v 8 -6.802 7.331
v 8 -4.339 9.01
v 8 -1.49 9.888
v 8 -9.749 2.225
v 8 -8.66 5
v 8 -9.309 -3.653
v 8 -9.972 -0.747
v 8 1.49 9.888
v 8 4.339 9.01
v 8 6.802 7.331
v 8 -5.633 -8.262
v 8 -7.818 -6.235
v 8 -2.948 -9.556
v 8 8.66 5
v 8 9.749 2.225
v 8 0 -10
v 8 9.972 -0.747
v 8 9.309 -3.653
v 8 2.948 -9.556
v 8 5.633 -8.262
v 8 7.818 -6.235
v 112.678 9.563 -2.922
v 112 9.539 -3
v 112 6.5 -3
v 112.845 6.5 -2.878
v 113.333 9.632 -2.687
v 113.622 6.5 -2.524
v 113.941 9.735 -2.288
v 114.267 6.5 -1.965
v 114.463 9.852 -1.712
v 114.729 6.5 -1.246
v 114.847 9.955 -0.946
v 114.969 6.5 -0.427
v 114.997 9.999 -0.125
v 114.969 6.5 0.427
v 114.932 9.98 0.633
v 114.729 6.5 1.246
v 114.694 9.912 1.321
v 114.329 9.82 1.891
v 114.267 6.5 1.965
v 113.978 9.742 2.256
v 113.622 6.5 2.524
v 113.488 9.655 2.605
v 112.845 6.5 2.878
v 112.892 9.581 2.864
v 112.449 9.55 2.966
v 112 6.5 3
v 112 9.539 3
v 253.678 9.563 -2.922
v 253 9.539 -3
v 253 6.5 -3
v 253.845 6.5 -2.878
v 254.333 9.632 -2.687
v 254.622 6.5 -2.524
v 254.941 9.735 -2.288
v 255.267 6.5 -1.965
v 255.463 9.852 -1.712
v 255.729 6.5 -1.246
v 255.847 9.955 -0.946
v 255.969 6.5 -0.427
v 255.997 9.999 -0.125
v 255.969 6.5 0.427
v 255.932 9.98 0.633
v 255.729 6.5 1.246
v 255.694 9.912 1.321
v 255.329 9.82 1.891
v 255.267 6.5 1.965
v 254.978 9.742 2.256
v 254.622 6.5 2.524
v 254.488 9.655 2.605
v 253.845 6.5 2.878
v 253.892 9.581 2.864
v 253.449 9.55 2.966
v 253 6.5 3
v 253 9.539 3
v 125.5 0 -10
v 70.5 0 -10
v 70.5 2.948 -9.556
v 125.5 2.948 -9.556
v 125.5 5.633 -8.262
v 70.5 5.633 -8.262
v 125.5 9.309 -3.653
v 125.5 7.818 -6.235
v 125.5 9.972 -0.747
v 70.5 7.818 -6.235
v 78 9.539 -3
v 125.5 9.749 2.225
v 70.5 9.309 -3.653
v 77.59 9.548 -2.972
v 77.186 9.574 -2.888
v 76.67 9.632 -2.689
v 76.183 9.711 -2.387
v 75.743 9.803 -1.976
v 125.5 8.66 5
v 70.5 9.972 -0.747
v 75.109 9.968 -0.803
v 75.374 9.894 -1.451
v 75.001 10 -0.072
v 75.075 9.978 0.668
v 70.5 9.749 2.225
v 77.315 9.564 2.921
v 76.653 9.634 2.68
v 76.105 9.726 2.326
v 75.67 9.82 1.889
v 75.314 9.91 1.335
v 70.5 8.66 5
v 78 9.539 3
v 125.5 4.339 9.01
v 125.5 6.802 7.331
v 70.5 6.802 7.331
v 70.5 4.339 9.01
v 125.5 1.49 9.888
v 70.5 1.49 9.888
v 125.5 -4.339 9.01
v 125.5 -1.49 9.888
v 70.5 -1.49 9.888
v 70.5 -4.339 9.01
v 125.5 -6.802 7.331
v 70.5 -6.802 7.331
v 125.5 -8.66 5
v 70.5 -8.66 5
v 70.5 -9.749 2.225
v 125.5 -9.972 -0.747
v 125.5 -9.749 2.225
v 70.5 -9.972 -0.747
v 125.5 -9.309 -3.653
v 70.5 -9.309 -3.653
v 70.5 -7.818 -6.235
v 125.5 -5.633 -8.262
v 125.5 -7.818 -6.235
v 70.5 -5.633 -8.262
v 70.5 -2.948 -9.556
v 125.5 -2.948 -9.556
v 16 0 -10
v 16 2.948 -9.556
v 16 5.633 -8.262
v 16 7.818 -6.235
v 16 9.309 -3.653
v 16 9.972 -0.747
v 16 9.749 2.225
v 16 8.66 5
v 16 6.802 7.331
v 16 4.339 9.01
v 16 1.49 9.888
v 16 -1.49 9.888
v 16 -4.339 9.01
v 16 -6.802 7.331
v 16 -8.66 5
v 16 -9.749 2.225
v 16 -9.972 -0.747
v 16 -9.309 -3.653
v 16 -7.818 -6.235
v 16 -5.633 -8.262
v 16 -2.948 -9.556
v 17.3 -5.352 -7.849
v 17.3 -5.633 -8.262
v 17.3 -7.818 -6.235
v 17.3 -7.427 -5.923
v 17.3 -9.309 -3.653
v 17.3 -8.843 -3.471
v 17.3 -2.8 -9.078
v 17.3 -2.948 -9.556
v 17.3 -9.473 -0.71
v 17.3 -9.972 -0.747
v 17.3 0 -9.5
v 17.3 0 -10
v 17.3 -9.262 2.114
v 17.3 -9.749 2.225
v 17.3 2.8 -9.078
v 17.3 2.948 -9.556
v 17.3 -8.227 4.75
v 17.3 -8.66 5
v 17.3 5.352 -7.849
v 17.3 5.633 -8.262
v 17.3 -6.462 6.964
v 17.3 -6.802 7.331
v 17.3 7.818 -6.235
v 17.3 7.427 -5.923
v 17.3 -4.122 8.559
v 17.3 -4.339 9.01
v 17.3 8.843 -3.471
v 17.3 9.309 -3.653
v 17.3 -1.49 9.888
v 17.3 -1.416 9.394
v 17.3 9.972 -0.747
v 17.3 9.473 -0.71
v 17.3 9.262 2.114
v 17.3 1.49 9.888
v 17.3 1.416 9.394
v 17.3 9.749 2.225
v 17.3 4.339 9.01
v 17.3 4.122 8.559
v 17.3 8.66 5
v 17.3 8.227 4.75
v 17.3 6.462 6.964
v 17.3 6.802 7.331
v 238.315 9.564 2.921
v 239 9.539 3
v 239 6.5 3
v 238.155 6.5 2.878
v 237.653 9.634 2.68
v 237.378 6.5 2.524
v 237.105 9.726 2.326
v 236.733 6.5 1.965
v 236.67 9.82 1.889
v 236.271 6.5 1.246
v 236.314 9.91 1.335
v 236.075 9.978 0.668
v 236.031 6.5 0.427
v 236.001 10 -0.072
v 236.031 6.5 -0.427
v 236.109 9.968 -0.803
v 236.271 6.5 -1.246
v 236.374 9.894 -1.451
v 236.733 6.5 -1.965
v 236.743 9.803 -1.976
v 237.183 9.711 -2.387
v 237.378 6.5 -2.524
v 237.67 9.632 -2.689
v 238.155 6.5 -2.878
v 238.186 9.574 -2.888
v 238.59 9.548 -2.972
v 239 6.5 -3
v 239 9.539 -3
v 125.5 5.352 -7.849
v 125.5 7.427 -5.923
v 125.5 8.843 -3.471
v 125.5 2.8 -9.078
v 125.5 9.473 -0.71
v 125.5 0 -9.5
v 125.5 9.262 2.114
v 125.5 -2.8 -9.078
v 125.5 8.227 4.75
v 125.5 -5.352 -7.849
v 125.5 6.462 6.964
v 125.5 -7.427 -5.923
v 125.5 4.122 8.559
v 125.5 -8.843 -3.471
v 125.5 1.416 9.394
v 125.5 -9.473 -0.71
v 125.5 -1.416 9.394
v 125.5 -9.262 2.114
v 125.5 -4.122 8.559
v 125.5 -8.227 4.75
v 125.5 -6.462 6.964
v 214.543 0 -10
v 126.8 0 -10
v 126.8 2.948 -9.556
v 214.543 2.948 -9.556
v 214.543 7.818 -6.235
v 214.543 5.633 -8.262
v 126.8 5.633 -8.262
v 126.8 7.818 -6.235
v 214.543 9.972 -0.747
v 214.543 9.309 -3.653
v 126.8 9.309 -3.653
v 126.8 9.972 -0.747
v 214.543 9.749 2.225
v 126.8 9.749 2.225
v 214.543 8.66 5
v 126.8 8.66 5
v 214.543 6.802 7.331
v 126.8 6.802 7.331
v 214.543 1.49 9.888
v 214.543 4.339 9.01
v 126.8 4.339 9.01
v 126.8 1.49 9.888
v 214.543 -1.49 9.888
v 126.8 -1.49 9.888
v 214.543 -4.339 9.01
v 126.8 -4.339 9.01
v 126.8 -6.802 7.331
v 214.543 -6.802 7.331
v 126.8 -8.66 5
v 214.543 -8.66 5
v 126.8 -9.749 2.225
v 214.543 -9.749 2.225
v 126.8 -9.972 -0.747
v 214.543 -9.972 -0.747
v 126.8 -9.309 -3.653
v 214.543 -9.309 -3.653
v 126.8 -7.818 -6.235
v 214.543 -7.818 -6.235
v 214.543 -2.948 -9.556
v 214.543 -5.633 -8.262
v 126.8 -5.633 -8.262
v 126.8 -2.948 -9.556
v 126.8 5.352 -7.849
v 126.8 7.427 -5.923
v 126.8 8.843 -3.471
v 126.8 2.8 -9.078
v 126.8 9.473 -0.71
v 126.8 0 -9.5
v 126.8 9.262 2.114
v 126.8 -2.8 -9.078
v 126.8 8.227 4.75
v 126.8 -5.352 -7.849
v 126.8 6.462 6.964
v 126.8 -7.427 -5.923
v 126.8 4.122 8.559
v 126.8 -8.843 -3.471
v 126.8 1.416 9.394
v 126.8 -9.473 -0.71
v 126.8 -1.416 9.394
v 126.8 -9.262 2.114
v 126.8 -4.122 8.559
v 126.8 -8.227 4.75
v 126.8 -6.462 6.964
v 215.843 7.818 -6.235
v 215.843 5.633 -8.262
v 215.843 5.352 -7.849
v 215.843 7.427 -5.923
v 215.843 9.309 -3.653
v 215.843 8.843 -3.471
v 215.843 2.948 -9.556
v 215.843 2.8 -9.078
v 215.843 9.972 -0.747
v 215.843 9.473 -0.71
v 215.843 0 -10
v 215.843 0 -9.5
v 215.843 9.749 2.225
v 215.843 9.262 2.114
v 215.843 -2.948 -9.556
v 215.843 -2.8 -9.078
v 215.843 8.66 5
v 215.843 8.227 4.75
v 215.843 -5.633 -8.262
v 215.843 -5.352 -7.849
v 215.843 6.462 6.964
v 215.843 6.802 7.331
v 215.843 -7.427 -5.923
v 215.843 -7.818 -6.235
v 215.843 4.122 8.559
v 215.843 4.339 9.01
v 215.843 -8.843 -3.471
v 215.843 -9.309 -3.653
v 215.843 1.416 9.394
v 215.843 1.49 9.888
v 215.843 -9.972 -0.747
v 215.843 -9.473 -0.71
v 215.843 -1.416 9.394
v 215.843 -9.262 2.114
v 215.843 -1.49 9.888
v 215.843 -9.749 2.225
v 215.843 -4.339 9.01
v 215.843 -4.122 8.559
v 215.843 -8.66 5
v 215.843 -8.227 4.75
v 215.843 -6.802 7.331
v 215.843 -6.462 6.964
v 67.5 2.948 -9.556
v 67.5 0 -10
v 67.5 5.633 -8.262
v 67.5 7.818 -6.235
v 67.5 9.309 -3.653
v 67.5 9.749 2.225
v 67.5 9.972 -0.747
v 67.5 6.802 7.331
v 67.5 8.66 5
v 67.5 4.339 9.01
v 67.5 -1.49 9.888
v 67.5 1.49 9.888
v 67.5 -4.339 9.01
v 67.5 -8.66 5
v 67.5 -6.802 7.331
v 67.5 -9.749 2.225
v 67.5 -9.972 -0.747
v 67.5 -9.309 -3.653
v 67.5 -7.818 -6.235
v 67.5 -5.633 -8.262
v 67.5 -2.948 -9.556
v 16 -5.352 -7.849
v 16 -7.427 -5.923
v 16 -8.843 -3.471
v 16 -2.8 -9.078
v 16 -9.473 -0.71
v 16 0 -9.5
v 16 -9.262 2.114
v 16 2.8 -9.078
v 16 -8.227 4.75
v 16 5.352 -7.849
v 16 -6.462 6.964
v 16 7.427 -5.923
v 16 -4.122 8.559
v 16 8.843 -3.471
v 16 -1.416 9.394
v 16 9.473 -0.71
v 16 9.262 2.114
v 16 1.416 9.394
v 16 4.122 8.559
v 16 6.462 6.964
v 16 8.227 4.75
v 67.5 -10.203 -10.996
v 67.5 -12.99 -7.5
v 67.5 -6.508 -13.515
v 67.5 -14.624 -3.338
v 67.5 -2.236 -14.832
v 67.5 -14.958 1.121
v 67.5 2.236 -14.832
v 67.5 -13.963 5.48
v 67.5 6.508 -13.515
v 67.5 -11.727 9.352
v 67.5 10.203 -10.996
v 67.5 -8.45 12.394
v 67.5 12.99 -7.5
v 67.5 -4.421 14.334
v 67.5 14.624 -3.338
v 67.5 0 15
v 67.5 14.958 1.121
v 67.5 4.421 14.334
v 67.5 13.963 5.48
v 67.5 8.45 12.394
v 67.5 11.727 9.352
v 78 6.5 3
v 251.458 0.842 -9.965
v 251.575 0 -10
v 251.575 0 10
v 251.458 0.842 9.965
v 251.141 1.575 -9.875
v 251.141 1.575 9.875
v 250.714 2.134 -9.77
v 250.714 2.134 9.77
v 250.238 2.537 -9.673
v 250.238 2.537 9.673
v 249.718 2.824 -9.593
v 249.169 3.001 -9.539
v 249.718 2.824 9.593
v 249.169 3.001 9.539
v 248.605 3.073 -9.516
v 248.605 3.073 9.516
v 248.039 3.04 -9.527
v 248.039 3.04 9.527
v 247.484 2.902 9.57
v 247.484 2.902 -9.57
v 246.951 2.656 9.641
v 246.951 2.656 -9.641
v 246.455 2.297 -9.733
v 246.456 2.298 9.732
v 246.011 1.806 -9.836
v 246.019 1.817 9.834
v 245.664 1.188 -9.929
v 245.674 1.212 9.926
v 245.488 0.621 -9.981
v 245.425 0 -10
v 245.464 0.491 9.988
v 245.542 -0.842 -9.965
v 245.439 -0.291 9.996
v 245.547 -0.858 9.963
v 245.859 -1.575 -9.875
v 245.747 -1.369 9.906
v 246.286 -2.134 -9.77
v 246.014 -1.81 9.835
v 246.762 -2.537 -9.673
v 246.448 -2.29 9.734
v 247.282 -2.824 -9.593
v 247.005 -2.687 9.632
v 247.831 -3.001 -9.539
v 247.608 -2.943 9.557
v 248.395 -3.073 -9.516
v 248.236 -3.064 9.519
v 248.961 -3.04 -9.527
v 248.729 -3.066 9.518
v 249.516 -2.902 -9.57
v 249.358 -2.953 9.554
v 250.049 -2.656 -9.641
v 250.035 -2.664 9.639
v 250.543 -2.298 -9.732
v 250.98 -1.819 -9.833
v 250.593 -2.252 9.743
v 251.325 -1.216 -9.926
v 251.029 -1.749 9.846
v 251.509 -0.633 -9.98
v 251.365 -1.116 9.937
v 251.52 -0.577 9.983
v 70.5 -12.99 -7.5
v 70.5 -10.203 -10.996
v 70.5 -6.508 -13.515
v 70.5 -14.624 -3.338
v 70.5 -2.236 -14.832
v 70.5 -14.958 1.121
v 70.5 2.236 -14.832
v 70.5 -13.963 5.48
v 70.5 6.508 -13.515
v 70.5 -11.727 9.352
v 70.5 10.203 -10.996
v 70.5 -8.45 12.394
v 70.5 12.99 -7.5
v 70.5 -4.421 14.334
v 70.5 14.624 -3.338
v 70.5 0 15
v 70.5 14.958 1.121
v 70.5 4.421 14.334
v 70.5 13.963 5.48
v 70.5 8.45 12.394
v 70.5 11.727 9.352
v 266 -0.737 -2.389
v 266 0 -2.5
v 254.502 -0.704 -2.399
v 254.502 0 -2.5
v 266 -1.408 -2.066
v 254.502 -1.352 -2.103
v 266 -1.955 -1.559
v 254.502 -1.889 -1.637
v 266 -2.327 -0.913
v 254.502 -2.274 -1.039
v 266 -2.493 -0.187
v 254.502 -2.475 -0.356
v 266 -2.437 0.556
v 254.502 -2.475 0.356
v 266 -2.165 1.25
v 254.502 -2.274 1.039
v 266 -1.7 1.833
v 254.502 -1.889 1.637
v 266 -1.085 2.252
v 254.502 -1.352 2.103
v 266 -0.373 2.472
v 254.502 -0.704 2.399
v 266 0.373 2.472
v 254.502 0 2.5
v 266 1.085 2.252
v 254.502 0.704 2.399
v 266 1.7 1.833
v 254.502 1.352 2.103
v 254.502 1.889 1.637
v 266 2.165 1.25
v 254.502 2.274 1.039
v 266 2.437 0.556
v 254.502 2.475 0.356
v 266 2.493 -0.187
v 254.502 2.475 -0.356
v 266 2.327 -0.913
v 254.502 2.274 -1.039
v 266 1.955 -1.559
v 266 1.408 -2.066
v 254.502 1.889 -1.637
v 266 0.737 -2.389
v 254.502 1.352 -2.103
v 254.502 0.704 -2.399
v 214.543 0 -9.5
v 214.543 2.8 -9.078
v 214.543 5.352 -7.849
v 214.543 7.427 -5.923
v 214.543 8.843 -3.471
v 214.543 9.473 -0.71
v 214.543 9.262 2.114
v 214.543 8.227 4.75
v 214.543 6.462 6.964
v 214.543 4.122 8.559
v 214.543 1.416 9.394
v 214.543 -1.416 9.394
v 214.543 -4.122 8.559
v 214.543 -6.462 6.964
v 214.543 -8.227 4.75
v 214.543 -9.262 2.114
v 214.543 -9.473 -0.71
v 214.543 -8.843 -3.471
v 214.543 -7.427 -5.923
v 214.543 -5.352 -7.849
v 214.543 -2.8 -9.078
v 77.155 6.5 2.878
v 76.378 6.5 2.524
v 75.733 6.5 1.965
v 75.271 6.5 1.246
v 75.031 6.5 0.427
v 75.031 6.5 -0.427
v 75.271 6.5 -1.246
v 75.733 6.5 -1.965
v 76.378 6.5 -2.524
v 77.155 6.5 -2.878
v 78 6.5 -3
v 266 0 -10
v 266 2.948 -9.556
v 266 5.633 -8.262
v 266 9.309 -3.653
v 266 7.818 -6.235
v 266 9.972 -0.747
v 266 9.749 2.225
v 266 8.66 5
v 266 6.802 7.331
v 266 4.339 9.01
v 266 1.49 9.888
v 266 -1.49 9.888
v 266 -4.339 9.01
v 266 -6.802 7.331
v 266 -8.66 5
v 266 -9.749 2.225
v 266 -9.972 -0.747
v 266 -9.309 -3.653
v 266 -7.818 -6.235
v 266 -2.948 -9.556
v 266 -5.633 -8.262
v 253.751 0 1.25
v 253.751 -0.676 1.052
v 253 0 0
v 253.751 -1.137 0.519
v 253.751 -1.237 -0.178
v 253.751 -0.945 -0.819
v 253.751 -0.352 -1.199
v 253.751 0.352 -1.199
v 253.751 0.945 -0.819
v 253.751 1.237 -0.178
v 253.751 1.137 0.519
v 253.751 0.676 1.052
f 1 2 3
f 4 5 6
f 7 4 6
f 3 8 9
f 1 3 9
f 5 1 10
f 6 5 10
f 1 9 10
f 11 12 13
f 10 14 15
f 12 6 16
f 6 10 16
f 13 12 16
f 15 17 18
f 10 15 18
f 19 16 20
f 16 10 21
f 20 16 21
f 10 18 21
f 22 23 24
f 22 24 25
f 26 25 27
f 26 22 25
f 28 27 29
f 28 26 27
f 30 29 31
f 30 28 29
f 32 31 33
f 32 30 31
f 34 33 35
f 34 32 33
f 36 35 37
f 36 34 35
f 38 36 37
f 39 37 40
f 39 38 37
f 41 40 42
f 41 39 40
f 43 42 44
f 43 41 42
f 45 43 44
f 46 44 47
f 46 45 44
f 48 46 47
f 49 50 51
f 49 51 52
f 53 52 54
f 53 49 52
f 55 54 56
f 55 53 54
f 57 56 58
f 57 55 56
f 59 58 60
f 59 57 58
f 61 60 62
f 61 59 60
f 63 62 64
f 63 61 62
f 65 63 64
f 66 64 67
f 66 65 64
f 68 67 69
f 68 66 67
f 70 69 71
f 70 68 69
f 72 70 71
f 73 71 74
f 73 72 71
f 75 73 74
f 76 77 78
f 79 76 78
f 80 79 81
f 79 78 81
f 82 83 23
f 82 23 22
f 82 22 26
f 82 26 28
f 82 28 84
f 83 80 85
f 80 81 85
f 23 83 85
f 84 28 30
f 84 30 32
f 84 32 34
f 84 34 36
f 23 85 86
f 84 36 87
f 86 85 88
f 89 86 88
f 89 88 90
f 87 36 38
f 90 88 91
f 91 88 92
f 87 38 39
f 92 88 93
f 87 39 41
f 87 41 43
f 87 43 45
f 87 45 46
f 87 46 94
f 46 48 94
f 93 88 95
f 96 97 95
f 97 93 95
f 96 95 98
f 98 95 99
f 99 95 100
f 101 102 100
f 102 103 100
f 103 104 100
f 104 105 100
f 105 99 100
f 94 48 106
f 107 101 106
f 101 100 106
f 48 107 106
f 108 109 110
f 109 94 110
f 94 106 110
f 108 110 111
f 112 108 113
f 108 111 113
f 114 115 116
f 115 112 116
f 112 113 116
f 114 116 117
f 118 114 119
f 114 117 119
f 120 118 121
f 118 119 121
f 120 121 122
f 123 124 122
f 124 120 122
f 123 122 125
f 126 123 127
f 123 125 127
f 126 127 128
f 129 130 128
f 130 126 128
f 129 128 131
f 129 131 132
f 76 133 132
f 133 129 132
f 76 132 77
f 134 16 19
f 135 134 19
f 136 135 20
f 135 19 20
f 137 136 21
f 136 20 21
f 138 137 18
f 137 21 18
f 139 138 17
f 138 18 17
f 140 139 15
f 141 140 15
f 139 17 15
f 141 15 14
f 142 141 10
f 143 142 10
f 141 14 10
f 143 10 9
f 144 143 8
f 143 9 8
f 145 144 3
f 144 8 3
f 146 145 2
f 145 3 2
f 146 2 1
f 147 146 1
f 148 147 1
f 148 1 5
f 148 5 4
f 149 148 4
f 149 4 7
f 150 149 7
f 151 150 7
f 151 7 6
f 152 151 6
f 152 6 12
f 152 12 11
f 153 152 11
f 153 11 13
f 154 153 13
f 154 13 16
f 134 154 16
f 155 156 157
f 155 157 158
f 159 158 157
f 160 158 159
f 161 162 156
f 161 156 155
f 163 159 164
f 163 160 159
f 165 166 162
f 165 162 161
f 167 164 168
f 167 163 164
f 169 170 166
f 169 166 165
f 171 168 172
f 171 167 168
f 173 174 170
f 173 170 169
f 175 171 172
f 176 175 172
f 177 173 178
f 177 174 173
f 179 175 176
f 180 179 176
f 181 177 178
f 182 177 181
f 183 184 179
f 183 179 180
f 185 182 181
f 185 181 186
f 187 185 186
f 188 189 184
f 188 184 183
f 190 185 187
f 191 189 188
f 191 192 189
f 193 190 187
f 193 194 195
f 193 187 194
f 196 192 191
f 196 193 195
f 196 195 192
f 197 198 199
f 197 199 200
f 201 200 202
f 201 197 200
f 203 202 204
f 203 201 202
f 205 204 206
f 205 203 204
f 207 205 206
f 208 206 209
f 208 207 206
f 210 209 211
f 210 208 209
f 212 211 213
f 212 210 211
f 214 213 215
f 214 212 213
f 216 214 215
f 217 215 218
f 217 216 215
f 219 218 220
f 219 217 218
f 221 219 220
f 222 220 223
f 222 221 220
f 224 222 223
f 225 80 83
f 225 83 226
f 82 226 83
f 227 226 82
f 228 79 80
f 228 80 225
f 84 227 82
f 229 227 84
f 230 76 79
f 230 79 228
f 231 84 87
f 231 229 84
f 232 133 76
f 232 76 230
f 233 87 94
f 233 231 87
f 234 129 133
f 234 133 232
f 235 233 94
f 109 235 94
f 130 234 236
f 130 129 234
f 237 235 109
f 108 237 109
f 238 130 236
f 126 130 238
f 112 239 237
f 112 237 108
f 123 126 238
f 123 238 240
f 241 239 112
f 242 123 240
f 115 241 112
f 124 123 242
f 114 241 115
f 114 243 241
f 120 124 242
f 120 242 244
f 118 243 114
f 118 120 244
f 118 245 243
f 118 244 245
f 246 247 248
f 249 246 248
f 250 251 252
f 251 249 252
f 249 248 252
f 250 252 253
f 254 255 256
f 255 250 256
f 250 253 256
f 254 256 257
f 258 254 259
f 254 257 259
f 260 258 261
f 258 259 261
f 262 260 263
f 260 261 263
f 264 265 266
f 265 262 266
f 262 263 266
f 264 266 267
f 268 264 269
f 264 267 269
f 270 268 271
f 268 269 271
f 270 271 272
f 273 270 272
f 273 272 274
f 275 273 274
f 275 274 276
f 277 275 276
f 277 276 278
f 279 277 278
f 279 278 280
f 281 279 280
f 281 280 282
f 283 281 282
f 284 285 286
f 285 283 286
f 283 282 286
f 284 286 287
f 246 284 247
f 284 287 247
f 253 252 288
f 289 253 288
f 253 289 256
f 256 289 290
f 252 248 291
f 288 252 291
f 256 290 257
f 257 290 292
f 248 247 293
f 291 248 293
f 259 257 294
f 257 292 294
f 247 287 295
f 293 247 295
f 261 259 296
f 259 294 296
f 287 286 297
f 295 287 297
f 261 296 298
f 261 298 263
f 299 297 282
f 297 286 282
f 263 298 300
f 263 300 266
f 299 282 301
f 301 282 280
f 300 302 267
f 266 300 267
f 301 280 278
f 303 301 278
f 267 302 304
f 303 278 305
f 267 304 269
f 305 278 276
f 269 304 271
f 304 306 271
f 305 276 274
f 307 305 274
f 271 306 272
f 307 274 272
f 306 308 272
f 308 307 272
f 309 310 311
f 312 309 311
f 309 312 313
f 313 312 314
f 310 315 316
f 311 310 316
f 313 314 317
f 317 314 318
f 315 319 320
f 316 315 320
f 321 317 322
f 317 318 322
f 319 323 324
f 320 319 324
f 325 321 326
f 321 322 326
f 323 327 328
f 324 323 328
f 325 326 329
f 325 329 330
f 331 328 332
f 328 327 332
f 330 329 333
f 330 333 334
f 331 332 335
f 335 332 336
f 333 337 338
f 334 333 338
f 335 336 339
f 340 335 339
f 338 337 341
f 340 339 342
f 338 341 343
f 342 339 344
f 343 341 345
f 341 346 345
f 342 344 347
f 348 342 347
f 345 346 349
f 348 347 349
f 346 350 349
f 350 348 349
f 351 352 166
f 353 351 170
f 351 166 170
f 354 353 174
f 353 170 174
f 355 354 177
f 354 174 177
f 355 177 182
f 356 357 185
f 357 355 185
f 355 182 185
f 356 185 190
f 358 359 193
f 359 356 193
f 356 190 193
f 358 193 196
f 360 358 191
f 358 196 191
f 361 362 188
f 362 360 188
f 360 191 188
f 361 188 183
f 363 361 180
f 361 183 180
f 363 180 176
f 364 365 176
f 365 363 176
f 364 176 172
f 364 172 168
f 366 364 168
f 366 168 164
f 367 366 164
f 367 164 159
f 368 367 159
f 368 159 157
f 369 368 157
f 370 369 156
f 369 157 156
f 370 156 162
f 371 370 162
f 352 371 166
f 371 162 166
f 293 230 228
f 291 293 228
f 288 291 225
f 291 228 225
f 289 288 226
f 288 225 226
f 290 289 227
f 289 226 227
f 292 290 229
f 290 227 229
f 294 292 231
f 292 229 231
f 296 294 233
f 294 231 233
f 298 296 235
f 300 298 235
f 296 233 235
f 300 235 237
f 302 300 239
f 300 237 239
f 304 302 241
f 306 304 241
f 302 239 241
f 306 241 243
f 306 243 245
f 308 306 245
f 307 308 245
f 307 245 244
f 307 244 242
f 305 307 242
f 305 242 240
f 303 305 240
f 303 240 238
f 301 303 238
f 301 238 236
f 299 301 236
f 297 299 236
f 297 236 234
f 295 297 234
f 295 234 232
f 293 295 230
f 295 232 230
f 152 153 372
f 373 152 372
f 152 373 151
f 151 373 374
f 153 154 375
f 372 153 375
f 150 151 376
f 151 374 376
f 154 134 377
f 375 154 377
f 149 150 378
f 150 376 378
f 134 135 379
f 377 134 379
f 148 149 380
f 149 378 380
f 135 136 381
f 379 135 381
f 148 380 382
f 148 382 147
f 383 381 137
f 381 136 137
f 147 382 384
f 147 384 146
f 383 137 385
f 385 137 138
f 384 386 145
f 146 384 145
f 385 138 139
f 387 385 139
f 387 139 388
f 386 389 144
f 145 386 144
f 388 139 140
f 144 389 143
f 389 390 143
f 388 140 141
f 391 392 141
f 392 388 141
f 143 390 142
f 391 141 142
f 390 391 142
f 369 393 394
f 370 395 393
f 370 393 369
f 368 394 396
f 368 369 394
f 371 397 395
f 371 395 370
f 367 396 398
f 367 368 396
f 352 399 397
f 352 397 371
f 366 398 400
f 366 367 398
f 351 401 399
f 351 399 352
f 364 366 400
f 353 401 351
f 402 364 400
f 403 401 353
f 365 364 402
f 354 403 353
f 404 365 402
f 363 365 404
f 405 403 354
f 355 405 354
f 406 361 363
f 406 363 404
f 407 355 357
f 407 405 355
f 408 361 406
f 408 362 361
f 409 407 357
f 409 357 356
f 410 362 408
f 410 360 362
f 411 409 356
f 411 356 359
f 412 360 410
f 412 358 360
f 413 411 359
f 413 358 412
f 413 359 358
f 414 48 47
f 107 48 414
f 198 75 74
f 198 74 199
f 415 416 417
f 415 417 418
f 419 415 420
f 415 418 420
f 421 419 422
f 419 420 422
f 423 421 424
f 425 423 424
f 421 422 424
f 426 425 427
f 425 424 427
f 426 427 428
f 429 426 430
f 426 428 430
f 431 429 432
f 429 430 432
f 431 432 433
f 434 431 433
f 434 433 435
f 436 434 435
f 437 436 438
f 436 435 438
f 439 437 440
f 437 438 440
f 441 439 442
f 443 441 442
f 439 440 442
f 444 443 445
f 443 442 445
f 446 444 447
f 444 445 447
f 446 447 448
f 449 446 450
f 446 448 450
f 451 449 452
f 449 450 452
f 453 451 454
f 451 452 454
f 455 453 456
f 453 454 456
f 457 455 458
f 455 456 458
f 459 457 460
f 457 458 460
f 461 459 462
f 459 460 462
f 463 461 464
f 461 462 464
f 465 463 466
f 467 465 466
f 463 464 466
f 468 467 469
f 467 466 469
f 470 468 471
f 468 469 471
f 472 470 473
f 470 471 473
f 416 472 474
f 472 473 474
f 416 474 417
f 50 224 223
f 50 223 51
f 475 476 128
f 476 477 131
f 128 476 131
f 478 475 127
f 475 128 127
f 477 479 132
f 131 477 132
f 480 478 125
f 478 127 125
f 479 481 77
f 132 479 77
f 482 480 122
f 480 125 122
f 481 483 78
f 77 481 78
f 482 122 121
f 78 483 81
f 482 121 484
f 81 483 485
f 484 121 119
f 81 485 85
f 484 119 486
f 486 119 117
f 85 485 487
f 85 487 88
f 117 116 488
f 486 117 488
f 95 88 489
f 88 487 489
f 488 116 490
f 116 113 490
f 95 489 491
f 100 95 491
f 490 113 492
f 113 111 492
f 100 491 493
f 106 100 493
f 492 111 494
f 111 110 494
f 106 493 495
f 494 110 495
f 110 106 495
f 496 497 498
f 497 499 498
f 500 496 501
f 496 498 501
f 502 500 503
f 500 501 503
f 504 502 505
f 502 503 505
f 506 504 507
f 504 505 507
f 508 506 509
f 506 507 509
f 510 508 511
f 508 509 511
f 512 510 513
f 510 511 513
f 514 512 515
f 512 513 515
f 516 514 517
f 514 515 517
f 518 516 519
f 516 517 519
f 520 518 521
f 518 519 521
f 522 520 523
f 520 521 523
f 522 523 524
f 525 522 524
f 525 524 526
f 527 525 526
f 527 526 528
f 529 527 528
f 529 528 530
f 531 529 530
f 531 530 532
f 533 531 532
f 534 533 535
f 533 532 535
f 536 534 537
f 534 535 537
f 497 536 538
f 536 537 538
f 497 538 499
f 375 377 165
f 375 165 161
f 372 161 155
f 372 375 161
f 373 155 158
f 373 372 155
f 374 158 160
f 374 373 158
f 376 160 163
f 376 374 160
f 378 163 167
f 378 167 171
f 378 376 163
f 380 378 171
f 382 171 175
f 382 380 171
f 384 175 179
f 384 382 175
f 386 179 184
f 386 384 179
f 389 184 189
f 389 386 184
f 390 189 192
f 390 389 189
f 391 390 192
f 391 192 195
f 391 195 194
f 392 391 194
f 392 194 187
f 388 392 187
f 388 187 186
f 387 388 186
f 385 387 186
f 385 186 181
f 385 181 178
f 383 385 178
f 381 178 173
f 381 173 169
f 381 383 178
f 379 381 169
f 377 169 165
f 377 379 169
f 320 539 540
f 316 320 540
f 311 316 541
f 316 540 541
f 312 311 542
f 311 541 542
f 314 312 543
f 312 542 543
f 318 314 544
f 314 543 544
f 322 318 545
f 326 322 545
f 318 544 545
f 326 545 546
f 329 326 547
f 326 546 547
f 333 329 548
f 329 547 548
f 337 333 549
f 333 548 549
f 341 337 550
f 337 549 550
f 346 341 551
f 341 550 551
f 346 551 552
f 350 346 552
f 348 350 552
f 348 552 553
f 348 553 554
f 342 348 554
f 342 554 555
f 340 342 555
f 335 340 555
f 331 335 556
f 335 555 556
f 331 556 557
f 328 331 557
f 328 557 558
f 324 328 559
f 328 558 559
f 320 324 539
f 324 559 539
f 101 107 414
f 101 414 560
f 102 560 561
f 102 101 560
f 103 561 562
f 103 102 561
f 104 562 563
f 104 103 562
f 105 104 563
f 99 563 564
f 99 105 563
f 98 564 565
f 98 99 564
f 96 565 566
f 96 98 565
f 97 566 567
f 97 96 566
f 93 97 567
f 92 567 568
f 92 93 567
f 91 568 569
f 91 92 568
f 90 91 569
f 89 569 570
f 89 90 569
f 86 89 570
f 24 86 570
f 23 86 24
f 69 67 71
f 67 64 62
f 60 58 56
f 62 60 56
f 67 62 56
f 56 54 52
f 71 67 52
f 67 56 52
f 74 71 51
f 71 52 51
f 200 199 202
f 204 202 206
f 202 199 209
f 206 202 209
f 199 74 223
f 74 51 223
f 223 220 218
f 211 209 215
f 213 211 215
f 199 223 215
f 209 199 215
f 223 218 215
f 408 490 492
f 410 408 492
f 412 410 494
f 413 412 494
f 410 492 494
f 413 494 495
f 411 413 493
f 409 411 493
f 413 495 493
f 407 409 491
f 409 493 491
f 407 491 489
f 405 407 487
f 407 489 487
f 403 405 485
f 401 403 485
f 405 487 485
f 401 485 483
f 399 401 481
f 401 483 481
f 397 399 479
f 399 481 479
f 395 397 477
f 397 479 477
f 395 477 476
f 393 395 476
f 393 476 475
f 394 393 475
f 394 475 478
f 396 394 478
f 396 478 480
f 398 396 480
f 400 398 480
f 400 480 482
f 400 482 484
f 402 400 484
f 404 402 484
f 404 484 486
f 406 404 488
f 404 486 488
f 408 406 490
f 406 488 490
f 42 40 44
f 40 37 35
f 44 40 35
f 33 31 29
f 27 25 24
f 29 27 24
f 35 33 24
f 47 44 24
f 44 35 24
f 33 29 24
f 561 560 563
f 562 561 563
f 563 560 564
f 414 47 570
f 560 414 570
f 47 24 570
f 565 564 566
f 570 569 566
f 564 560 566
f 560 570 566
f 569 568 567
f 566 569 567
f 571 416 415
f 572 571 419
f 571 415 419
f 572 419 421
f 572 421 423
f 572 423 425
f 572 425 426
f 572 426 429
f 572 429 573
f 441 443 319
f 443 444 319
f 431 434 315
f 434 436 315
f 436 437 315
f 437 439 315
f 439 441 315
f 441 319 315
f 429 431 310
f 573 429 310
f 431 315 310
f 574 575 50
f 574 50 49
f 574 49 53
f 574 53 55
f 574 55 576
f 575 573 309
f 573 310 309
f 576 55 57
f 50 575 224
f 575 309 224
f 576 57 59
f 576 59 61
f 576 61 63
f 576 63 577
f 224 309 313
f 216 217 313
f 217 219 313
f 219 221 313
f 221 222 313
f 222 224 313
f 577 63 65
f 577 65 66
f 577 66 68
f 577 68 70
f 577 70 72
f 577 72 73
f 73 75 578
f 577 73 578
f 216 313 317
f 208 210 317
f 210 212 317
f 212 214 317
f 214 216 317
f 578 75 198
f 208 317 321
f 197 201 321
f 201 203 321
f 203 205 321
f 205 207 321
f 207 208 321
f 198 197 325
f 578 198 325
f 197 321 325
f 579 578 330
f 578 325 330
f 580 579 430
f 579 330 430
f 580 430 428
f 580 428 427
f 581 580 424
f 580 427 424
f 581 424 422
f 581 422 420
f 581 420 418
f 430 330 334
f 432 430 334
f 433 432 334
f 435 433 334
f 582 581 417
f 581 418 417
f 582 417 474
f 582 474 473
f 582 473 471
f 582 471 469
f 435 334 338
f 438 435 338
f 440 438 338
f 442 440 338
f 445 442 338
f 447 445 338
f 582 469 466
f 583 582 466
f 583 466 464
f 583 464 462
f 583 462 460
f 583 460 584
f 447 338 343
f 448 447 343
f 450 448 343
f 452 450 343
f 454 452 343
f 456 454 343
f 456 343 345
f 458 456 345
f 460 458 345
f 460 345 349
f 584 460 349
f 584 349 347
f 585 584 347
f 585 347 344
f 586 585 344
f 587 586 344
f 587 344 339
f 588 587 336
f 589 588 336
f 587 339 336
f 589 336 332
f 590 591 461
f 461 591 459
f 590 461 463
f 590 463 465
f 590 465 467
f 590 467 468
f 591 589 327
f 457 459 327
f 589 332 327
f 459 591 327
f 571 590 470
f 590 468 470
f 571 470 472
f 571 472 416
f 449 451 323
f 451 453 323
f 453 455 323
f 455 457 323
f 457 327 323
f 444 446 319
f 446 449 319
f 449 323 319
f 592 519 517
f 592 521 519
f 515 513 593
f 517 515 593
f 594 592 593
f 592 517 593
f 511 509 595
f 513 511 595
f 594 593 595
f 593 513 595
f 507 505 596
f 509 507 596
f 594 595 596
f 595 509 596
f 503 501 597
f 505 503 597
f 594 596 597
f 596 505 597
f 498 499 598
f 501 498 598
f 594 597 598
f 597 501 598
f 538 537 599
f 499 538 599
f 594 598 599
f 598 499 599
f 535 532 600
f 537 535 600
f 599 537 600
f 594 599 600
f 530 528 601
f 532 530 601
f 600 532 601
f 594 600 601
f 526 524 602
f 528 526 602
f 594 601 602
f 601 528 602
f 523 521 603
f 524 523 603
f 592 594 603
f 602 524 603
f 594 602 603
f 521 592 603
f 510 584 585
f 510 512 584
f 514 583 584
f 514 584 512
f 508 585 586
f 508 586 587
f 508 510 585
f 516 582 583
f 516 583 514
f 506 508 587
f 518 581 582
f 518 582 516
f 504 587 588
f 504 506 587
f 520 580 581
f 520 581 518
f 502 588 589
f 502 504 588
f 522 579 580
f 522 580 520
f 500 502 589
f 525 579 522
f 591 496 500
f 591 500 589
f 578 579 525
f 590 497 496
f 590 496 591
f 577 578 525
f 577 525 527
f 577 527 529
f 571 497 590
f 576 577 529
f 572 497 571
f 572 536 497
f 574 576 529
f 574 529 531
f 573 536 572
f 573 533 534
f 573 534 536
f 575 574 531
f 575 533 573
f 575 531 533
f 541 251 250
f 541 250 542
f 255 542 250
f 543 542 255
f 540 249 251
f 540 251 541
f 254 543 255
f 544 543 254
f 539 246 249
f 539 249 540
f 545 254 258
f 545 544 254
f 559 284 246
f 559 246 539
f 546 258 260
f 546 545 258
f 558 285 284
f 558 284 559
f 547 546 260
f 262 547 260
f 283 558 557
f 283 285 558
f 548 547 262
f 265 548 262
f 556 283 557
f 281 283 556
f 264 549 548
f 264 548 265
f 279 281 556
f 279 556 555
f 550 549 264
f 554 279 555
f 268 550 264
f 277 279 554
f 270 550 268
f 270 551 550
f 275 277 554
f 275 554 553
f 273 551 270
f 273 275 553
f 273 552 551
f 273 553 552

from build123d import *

# Parameters (mm, degrees)
SALIENTE_EXTRUIR1_START                = 8
CROQUIS1_R                             = 10
SALIENTE_EXTRUIR1_DEPTH                = 258
CROQUIS2_R                             = 15
SALIENTE_EXTRUIR2_DEPTH                = 3
CORTAR_EXTRUIR1_REACH                  = 268.845
CORTAR_EXTRUIR1_END_RADIUS             = 10
CROQUIS3_R                             = 3.075
CORTAR_EXTRUIR1_DIRECTION_2_REACH      = 268.845
CORTAR_EXTRUIR1_DIRECTION_2_END_RADIUS = 10
CORTAR_EXTRUIR2_START                  = 10
CORTAR_EXTRUIR2_DEPTH                  = 3.5
TALADRO_ROSCADO_M61_D                  = 5
TALADRO_ROSCADO_M61_DEPTH              = 11.497848452
TALADRO_ROSCADO_M61_TIP                = 1.502151548
CORTAR_EXTRUIR3_START                  = 10
CORTAR_EXTRUIR3_DEPTH                  = 3.5
CORTAR_EXTRUIR4_START                  = 125.5
CROQUIS9_R                             = 10
CROQUIS9_R_2                           = 9.5
CORTAR_EXTRUIR4_DEPTH                  = 1.3
CORTAR_EXTRUIR5_START                  = 214.543146
CROQUIS10_R                            = 10
CROQUIS10_R_2                          = 9.5
CORTAR_EXTRUIR5_DEPTH                  = 1.3
CORTAR_EXTRUIR6_START                  = -8
CROQUIS11_R                            = 10
CROQUIS11_R_2                          = 9.5
CORTAR_EXTRUIR6_DEPTH                  = 1.3


with BuildPart() as part:
    # Croquis1 → Saliente-Extruir1 (new body)
    with BuildSketch(Plane(origin=(0, 0, 0), x_dir=(0, 0, -1), z_dir=(1, 0, 0)).offset(SALIENTE_EXTRUIR1_START)):
        Circle(CROQUIS1_R)
    extrude(amount=SALIENTE_EXTRUIR1_DEPTH)

    # Croquis2 → Saliente-Extruir2 (add)
    with BuildSketch(Plane.ZY.offset(-70.5)):
        Circle(CROQUIS2_R)
    extrude(amount=SALIENTE_EXTRUIR2_DEPTH)

    # Cortar-Extruir1: up to this cylinder (the profile starts inside it)
    cortar_extruir1_end = Plane(origin=(248.5, 0, 0), z_dir=(-1, 0, 0)) * Cylinder(CORTAR_EXTRUIR1_END_RADIUS, 558.69, mode=Mode.PRIVATE)
    # Croquis3 → Cortar-Extruir1 (cut, up to the surface)
    with BuildSketch(Plane.XY, mode=Mode.PRIVATE) as cortar_extruir1_sk1:
        with Locations((248.5, 0)):
            Circle(CROQUIS3_R)
    cortar_extruir1_tool1 = extrude(cortar_extruir1_sk1.sketch, amount=-CORTAR_EXTRUIR1_REACH, mode=Mode.PRIVATE) & cortar_extruir1_end
    add(cortar_extruir1_tool1.solids().sort_by_distance((248.5, 0, 0))[0], mode=Mode.SUBTRACT)

    # Cortar-Extruir1 direction 2: up to this cylinder (the profile starts inside it)
    cortar_extruir1_direction_2_end = Plane(origin=(248.5, 0, 0), z_dir=(-1, 0, 0)) * Cylinder(CORTAR_EXTRUIR1_DIRECTION_2_END_RADIUS, 558.69, mode=Mode.PRIVATE)
    # Croquis3 → Cortar-Extruir1 direction 2 (cut, up to the surface)
    with BuildSketch(Plane.XY, mode=Mode.PRIVATE) as cortar_extruir1_direction_2_sk1:
        with Locations((248.5, 0)):
            Circle(CROQUIS3_R)
    cortar_extruir1_direction_2_tool1 = extrude(cortar_extruir1_direction_2_sk1.sketch, amount=CORTAR_EXTRUIR1_DIRECTION_2_REACH, mode=Mode.PRIVATE) & cortar_extruir1_direction_2_end
    add(cortar_extruir1_direction_2_tool1.solids().sort_by_distance((248.5, 0, 0))[0], mode=Mode.SUBTRACT)

    # Croquis4 → Cortar-Extruir2 (cut)
    with BuildSketch(Plane(origin=(0, 0, 0), x_dir=(1, 0, 0), z_dir=(0, 1, 0)).offset(CORTAR_EXTRUIR2_START)):
        with BuildLine():
            Line((239, 3), (253, 3))
            ThreePointArc((253, 3), (256, 0), (253, -3))
            Line((253, -3), (239, -3))
            ThreePointArc((239, -3), (236, 0), (239, 3))
        make_face()
    extrude(amount=-CORTAR_EXTRUIR2_DEPTH, mode=Mode.SUBTRACT)

    # Taladro roscado M61
    with Locations(Plane(origin=(266, 0, 0), x_dir=(0, 0, 1), z_dir=(1, 0, 0))):
        with Locations((0, 0)):
            Hole(TALADRO_ROSCADO_M61_D / 2, depth=TALADRO_ROSCADO_M61_DEPTH)
            with Locations((0, 0, -(TALADRO_ROSCADO_M61_DEPTH + TALADRO_ROSCADO_M61_TIP / 2))):  # 118° drill point
                Cone(0, TALADRO_ROSCADO_M61_D / 2, TALADRO_ROSCADO_M61_TIP, mode=Mode.SUBTRACT)

    # Croquis8 → Cortar-Extruir3 (cut)
    with BuildSketch(Plane(origin=(0, 0, 0), x_dir=(1, 0, 0), z_dir=(0, 1, 0)).offset(CORTAR_EXTRUIR3_START)):
        with BuildLine():
            Line((78, 3), (112, 3))
            ThreePointArc((112, 3), (115, 0), (112, -3))
            Line((112, -3), (78, -3))
            ThreePointArc((78, -3), (75, 0), (78, 3))
        make_face()
    extrude(amount=-CORTAR_EXTRUIR3_DEPTH, mode=Mode.SUBTRACT)

    # Croquis9 → Cortar-Extruir4 (cut)
    with BuildSketch(Plane(origin=(0, 0, 0), x_dir=(0, 0, -1), z_dir=(1, 0, 0)).offset(CORTAR_EXTRUIR4_START)):
        with Locations(Location((0, 0, 0), (0, 0, 180))):
            Circle(CROQUIS9_R)
        Circle(CROQUIS9_R_2, mode=Mode.SUBTRACT)
    extrude(amount=CORTAR_EXTRUIR4_DEPTH, mode=Mode.SUBTRACT)

    # Croquis10 → Cortar-Extruir5 (cut)
    with BuildSketch(Plane(origin=(0, 0, 0), x_dir=(0, 0, -1), z_dir=(1, 0, 0)).offset(CORTAR_EXTRUIR5_START)):
        with Locations(Location((0, 0, 0), (0, 0, 180))):
            Circle(CROQUIS10_R)
        Circle(CROQUIS10_R_2, mode=Mode.SUBTRACT)
    extrude(amount=CORTAR_EXTRUIR5_DEPTH, mode=Mode.SUBTRACT)

    # Croquis11 → Cortar-Extruir6 (cut)
    with BuildSketch(Plane.ZY.offset(-8).offset(CORTAR_EXTRUIR6_START)):
        Circle(CROQUIS11_R)
        with Locations(Location((0, 0, 0), (0, 0, 180))):
            Circle(CROQUIS11_R_2, mode=Mode.SUBTRACT)
    extrude(amount=-CORTAR_EXTRUIR6_DEPTH, mode=Mode.SUBTRACT)


solid = part.part
